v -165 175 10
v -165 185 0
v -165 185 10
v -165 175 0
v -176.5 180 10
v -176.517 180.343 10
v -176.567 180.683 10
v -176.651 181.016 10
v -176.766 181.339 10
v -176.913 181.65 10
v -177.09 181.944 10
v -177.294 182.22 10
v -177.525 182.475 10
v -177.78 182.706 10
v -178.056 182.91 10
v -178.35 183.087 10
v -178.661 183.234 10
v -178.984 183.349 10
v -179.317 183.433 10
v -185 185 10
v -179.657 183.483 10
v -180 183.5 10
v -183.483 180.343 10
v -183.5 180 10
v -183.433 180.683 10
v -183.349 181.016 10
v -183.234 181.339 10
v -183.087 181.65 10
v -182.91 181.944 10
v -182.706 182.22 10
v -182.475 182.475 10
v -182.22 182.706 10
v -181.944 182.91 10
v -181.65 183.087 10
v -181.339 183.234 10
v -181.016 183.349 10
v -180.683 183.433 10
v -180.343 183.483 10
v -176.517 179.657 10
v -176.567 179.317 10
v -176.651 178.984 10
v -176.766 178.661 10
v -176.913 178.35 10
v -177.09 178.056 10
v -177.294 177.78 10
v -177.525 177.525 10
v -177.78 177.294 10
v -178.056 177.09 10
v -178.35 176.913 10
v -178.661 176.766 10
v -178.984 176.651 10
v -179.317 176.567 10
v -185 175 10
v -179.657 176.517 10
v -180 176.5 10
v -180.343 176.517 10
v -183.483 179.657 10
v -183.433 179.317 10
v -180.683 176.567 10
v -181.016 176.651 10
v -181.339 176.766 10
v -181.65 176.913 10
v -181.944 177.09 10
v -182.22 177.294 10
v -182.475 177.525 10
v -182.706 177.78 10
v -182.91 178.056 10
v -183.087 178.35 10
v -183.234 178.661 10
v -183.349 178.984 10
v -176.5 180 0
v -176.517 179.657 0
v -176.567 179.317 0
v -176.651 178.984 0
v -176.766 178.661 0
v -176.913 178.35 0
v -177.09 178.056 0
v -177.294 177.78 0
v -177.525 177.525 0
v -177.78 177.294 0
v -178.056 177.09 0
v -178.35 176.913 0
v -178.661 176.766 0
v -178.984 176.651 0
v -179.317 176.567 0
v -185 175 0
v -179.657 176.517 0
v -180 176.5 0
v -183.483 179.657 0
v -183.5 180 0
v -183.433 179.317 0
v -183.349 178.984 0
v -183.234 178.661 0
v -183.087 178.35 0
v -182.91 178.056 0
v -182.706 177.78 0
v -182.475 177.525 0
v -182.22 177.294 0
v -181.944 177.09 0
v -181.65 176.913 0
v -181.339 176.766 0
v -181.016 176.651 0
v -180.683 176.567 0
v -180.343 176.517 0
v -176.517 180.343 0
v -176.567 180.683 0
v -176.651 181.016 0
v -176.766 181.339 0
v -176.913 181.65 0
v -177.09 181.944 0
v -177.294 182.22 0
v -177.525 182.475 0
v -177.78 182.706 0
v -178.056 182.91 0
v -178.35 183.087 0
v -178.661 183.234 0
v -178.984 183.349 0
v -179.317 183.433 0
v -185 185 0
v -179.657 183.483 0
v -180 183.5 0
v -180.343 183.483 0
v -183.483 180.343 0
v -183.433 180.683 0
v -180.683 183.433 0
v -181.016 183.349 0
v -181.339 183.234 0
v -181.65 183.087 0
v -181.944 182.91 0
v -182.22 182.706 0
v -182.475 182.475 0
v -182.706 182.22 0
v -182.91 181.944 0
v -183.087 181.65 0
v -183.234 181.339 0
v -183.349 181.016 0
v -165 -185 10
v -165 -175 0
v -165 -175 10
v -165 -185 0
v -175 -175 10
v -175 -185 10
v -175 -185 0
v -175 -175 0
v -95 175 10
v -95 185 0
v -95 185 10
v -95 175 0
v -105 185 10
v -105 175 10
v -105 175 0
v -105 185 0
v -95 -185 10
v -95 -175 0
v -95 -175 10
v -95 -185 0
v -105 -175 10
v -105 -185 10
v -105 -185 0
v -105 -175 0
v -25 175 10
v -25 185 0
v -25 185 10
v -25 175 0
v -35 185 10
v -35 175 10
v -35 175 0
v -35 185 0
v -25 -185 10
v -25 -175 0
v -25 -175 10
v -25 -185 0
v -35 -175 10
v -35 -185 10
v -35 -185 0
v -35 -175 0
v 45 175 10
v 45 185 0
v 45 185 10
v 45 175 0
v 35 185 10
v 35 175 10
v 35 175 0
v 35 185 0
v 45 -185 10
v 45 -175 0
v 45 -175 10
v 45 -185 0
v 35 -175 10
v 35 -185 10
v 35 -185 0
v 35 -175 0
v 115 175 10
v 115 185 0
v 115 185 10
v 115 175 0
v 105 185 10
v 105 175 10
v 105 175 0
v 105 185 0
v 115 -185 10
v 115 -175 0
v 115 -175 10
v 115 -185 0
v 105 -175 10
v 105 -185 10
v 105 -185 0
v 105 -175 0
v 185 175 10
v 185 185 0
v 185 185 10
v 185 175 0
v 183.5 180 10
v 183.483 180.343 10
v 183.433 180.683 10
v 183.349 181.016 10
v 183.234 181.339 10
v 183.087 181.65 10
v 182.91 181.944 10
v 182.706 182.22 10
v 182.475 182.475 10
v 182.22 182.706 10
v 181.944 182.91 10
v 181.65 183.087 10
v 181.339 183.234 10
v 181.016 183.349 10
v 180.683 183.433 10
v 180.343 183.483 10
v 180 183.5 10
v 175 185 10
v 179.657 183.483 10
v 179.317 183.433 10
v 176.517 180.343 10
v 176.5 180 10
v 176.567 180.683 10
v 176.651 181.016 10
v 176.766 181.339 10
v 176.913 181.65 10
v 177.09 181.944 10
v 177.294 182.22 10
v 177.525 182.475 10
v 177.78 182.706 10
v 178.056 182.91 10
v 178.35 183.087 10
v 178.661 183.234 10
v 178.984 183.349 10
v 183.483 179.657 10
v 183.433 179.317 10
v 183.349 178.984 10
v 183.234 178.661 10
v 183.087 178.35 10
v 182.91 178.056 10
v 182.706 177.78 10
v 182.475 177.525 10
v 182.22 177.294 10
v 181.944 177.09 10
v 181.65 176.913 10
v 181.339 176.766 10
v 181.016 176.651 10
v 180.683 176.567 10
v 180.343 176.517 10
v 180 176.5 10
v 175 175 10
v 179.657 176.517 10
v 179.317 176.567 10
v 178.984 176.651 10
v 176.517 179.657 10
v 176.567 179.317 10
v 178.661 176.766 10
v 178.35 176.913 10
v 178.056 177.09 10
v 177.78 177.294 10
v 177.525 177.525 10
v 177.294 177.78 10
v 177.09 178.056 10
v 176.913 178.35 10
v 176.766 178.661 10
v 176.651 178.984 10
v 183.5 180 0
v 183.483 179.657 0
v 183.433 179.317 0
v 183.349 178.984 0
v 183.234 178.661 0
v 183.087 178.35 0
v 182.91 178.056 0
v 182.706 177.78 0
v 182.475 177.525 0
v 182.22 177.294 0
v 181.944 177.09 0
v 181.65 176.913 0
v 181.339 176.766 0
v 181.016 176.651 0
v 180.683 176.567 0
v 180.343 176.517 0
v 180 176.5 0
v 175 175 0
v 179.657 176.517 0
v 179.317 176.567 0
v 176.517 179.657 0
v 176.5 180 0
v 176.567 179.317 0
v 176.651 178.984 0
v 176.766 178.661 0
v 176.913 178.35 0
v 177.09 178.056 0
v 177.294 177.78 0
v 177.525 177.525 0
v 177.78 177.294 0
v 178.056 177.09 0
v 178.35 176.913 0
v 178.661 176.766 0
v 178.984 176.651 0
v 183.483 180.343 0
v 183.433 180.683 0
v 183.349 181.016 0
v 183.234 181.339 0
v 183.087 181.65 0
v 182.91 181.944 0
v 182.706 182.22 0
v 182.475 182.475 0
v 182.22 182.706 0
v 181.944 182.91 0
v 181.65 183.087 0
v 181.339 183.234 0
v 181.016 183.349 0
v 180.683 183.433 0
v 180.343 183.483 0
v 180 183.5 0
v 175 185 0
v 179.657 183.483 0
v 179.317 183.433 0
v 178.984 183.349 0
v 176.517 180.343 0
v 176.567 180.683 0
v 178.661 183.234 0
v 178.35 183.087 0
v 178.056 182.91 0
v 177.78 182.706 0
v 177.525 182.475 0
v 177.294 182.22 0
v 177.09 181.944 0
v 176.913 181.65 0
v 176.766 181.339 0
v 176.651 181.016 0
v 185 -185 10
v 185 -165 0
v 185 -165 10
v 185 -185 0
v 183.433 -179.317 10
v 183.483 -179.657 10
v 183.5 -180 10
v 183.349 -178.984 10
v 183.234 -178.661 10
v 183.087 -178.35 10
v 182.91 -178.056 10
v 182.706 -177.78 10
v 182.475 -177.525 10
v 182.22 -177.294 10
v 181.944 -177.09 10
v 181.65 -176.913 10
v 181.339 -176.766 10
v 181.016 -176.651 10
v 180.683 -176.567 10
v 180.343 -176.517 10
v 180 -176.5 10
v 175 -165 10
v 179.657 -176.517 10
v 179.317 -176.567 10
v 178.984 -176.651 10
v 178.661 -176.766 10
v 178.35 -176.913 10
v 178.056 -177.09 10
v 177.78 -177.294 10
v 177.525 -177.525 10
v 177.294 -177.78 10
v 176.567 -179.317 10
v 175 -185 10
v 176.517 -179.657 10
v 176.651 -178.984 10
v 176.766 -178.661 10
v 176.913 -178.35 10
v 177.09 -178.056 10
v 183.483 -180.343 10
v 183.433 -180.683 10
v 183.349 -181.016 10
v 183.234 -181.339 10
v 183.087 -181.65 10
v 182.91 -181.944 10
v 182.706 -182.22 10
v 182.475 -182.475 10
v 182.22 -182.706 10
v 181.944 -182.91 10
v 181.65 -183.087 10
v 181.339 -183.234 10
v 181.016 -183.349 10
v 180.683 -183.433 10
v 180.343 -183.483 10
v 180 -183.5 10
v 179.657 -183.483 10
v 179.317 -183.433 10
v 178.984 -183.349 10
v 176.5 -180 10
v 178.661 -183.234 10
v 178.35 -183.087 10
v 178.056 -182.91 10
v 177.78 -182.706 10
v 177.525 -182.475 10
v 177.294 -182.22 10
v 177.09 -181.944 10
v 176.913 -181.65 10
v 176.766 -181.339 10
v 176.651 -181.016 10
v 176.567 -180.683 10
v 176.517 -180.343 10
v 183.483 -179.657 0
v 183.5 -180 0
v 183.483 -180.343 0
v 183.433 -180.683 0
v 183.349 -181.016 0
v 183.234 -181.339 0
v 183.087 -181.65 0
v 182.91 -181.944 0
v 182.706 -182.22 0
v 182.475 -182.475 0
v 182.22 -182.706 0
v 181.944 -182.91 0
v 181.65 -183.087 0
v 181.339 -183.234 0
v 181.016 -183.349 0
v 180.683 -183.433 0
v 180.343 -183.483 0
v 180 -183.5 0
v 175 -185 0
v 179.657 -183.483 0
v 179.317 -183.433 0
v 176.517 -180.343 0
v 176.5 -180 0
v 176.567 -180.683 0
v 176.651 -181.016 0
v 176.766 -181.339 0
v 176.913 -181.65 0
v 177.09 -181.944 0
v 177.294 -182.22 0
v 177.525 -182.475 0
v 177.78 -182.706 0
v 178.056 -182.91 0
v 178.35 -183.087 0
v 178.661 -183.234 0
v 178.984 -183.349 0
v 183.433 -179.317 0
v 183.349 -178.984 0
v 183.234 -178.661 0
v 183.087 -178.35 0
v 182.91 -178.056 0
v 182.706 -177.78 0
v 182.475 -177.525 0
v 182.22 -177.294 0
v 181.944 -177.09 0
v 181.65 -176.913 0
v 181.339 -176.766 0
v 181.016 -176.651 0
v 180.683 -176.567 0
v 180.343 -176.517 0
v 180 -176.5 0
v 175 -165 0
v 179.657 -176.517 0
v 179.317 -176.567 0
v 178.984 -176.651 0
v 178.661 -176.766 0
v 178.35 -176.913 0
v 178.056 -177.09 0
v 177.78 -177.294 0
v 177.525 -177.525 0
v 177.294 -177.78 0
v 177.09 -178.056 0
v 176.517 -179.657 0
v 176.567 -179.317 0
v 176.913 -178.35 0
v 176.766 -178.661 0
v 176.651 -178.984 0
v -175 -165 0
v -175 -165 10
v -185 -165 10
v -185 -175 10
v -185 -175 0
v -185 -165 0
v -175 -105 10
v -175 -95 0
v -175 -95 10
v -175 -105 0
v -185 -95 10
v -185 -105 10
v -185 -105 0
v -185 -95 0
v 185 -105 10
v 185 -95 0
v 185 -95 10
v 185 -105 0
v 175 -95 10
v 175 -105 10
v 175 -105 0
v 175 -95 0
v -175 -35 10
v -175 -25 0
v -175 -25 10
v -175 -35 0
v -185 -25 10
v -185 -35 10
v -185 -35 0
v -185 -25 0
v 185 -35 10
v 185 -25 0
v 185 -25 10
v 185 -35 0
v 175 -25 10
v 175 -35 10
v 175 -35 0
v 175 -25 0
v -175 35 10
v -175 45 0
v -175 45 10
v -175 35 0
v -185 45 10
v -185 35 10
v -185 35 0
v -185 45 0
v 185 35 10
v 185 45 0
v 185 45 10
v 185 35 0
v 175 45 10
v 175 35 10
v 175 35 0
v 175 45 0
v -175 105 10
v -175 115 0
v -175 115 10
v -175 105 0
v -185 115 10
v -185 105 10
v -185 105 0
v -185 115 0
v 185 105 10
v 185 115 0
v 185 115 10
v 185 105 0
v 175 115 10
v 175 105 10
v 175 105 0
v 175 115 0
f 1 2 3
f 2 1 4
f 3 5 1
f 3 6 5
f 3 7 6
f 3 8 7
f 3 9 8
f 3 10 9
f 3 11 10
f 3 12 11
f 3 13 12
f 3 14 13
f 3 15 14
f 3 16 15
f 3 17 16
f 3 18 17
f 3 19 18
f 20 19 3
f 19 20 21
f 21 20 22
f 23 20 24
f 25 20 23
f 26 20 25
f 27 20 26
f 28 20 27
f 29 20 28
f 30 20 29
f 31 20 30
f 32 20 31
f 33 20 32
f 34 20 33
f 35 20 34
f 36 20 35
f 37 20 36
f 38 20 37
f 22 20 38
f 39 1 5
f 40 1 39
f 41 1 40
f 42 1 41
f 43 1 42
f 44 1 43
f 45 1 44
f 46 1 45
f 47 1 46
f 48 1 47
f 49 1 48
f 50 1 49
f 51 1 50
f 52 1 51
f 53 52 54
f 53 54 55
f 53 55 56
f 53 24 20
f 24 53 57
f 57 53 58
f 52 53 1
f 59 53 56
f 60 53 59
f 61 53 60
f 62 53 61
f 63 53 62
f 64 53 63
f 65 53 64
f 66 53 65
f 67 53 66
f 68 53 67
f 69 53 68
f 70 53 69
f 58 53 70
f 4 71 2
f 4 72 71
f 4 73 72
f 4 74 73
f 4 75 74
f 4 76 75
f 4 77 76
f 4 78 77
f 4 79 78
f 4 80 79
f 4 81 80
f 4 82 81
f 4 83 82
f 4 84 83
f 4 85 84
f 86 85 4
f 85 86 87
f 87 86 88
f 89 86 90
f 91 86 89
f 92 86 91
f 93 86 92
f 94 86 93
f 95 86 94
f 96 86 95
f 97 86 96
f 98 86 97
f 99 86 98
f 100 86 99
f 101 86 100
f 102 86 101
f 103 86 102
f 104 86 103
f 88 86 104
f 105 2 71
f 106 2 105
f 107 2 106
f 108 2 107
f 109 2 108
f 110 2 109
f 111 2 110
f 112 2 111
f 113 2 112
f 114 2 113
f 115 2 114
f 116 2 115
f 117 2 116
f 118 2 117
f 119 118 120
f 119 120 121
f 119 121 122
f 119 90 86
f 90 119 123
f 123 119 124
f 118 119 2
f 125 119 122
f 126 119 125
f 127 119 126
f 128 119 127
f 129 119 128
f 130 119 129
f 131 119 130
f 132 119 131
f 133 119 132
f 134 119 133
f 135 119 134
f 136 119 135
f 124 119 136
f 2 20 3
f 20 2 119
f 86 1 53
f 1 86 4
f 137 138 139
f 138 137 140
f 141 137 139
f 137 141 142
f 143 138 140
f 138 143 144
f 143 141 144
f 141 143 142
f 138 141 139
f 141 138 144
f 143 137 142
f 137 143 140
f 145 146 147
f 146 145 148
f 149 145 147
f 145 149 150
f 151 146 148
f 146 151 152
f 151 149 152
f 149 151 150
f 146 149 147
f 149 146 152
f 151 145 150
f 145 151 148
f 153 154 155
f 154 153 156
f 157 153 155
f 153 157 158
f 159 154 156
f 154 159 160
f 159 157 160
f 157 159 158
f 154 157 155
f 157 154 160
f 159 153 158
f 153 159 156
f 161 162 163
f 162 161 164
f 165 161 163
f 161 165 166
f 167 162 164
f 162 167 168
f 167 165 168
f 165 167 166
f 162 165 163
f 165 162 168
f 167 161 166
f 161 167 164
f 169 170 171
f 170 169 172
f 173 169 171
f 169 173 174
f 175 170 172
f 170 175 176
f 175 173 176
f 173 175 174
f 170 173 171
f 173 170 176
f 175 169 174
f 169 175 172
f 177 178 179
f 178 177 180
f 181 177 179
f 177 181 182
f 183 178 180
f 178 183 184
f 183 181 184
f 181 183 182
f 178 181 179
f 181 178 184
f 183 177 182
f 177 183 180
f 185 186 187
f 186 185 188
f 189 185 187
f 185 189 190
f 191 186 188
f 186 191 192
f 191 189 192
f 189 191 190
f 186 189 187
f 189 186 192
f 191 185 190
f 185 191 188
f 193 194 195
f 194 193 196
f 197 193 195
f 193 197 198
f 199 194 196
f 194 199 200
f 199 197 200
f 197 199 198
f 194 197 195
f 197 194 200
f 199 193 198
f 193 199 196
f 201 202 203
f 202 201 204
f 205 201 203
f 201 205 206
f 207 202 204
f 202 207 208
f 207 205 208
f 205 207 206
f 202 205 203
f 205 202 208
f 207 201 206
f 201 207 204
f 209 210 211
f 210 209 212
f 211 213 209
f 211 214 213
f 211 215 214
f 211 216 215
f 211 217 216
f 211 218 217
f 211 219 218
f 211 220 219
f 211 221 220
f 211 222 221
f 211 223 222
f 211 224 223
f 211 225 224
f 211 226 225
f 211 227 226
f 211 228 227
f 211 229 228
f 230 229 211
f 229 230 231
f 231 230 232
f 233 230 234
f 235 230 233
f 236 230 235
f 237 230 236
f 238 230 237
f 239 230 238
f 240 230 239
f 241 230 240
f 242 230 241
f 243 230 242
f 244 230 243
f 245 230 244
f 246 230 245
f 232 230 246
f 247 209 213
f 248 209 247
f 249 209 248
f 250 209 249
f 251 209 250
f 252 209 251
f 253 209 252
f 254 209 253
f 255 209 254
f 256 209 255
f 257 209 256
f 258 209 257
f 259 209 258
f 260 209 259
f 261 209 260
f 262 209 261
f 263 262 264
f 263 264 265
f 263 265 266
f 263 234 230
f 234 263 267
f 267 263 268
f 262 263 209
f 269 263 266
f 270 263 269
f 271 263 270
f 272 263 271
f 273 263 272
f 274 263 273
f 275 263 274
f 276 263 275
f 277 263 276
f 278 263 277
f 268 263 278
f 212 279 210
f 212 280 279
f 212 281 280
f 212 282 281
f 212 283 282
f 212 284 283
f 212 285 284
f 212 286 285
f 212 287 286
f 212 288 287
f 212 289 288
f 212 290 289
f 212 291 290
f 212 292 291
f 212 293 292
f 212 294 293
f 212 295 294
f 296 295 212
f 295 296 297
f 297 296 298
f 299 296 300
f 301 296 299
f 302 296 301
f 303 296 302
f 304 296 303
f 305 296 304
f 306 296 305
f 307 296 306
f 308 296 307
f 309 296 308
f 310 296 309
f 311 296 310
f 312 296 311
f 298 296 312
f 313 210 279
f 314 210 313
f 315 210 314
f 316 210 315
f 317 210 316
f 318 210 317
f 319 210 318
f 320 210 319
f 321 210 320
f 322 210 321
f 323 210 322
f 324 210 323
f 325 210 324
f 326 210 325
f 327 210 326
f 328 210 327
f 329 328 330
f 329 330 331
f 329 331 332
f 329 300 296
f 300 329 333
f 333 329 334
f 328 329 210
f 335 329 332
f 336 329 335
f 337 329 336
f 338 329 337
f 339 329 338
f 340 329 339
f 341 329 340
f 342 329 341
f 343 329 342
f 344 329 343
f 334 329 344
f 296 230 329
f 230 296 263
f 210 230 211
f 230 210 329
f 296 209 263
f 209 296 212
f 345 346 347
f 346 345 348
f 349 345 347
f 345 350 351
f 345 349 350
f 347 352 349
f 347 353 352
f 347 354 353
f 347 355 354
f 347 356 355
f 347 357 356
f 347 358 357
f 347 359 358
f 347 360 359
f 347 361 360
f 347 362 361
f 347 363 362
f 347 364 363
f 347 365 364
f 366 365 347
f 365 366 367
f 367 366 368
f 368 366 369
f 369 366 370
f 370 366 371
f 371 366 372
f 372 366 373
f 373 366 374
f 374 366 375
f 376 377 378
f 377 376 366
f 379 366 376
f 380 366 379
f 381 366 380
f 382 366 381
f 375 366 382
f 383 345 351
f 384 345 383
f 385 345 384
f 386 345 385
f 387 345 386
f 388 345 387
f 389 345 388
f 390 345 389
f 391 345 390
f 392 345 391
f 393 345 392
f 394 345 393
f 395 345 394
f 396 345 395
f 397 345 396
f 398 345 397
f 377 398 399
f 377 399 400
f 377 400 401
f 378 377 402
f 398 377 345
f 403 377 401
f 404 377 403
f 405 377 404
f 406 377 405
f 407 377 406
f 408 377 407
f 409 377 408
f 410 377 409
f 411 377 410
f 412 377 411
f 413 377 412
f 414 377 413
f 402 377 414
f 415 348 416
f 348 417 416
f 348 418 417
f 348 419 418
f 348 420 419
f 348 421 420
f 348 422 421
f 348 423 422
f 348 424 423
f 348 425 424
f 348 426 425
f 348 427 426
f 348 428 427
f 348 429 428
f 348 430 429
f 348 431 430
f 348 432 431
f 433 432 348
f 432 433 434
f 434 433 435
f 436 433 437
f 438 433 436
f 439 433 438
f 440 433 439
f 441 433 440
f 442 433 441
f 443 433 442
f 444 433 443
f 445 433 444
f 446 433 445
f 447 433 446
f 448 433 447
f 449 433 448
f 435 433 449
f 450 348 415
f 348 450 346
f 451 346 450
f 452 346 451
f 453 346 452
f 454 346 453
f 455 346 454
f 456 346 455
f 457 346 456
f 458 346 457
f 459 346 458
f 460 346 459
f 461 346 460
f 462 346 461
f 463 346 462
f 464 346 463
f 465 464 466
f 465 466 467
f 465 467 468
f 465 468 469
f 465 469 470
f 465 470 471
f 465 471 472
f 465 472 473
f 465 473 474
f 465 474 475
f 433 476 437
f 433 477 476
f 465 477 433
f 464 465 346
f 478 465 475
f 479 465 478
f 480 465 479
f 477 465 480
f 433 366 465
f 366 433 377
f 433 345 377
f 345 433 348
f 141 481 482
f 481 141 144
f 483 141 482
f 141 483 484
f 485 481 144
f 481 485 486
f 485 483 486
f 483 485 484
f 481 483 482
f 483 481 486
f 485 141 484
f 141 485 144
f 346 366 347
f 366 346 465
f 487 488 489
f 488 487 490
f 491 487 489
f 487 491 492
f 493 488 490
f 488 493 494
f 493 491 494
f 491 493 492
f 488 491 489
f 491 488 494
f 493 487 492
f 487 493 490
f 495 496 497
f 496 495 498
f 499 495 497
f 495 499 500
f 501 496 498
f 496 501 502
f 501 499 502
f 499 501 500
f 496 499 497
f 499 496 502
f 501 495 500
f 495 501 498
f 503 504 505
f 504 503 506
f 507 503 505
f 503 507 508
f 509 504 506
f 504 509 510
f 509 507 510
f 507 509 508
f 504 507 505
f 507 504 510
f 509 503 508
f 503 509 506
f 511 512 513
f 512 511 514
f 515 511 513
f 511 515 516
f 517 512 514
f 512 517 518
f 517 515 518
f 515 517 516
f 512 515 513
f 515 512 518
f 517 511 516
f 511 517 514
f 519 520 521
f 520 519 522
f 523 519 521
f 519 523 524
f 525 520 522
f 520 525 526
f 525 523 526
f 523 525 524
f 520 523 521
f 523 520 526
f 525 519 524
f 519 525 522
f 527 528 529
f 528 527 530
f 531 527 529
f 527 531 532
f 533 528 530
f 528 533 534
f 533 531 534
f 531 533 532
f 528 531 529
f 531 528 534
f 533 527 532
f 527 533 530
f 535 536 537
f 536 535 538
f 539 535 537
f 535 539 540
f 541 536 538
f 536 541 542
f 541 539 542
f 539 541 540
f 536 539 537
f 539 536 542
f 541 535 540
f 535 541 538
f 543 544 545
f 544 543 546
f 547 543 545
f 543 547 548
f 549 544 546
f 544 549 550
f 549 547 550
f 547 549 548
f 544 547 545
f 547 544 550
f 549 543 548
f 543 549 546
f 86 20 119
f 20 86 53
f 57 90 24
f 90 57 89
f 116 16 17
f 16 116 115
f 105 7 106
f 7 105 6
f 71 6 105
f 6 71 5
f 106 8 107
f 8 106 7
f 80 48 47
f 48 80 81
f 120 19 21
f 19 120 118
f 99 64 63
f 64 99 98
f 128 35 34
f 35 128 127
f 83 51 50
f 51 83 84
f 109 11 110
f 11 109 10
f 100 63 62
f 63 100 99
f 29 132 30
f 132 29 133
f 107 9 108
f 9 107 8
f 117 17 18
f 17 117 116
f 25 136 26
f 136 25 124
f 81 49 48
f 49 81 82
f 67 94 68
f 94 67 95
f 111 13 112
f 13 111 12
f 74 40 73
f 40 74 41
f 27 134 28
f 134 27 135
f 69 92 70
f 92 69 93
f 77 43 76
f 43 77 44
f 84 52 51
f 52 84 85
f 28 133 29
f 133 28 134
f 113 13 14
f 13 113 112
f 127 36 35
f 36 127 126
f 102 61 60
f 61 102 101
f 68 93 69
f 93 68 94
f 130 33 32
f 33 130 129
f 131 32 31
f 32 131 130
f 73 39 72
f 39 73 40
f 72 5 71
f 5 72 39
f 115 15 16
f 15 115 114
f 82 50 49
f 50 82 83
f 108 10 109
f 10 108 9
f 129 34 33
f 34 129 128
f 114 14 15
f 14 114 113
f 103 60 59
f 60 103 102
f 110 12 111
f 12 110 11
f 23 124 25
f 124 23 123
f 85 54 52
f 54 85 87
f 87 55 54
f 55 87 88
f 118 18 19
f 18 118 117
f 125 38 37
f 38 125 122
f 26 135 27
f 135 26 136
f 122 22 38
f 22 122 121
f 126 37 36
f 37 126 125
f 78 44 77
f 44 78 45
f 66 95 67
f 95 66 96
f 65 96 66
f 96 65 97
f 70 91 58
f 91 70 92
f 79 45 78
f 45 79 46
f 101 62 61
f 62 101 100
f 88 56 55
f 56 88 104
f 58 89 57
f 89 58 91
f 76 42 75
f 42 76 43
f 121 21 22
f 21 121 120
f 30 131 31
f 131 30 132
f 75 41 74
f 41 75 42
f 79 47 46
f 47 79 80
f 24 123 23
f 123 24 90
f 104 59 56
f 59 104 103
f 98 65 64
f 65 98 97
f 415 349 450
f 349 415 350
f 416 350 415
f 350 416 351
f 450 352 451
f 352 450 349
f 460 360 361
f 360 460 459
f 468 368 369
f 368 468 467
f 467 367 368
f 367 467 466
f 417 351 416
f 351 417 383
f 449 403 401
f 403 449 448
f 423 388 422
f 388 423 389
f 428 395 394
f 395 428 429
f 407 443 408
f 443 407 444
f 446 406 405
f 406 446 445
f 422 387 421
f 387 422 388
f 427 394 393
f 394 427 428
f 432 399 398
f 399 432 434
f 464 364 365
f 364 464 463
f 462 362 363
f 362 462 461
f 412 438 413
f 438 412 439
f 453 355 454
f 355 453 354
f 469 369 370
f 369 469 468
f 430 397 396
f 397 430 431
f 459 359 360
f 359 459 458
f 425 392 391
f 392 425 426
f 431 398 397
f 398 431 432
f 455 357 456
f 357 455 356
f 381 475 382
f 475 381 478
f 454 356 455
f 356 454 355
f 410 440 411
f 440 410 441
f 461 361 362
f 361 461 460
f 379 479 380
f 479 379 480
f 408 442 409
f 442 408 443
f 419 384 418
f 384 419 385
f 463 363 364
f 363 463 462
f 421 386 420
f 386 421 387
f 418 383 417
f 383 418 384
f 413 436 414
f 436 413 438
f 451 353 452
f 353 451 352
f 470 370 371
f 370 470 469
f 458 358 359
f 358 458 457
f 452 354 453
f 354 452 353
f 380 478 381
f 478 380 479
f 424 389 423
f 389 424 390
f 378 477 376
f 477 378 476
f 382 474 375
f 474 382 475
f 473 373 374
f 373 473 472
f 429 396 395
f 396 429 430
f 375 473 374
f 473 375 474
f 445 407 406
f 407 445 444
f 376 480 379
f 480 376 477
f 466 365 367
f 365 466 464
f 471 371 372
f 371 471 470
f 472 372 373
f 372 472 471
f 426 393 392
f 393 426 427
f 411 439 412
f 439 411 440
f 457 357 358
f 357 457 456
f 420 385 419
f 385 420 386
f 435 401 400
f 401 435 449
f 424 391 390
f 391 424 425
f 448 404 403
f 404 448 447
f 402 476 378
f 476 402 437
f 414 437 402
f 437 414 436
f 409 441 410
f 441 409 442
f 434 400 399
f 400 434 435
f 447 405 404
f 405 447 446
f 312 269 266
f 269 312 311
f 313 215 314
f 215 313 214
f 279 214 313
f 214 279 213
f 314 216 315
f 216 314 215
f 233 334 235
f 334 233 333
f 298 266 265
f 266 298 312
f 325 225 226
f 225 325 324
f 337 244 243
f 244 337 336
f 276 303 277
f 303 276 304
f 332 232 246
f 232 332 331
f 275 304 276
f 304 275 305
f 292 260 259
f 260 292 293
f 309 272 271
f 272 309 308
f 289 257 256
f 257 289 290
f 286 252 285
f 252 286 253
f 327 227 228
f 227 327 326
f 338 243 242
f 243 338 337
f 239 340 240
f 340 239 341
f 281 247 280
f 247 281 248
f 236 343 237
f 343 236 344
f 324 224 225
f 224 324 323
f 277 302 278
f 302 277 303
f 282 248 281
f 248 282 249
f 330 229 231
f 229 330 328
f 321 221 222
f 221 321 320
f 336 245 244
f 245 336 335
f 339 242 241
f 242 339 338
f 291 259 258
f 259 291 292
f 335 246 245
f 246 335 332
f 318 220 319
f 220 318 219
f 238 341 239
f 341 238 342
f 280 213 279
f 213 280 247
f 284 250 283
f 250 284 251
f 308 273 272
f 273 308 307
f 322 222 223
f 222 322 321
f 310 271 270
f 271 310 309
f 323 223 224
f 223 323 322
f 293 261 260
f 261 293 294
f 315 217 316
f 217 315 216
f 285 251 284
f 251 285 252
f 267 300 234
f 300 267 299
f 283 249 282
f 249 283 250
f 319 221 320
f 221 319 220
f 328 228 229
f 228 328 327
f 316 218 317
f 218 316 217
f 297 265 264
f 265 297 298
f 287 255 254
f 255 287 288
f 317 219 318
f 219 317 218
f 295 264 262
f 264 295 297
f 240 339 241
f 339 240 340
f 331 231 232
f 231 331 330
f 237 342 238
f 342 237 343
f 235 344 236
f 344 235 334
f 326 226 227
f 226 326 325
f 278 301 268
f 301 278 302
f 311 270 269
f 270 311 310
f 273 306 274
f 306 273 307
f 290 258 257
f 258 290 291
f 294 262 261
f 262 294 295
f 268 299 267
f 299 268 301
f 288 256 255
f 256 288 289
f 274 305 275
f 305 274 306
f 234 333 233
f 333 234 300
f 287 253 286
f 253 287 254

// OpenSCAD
// ring_47.scad - ring index 47 (z bottom = 470 mm)
$fn = 64; bar = 10; half_b = bar/2; outer = 370; half_outer = outer/2;
front_y = 180; back_y = -180; left_x = -180; right_x = 180;
x_centers = [-170, -100, -30, 40, 110, 180];
z_centers = [5, 85, 155, 225, 295, 365, 435, 505, 575, 645, 715]; ring_z = 470;
module place_box(cx, cy, sx, sy) { translate([cx - sx/2, cy - sy/2, 0]) cube([sx, sy, bar]); }

difference() { union() {
    for (x = x_centers) { place_box(x, front_y, bar, bar); place_box(x, back_y, bar, bar); }
    for (y = x_centers) { place_box(left_x, y, bar, bar); place_box(right_x, y, bar, bar); }
    for (zc = z_centers) if ((zc - half_b < ring_z + bar) && (zc + half_b > ring_z)) {
        translate([-half_outer, front_y - half_b, 0]) cube([outer, bar, bar]);
        translate([-half_outer, back_y - half_b, 0])  cube([outer, bar, bar]);
        translate([left_x - half_b, -half_outer, 0])  cube([bar, outer, bar]);
        translate([right_x - half_b, -half_outer, 0]) cube([bar, outer, bar]);
    }
  }
  for (cx = [-180, 180]) for (cy = [-180, 180]) translate([cx, cy, 0]) cylinder(h = bar, r = 3.5, $fn = 64);
}
